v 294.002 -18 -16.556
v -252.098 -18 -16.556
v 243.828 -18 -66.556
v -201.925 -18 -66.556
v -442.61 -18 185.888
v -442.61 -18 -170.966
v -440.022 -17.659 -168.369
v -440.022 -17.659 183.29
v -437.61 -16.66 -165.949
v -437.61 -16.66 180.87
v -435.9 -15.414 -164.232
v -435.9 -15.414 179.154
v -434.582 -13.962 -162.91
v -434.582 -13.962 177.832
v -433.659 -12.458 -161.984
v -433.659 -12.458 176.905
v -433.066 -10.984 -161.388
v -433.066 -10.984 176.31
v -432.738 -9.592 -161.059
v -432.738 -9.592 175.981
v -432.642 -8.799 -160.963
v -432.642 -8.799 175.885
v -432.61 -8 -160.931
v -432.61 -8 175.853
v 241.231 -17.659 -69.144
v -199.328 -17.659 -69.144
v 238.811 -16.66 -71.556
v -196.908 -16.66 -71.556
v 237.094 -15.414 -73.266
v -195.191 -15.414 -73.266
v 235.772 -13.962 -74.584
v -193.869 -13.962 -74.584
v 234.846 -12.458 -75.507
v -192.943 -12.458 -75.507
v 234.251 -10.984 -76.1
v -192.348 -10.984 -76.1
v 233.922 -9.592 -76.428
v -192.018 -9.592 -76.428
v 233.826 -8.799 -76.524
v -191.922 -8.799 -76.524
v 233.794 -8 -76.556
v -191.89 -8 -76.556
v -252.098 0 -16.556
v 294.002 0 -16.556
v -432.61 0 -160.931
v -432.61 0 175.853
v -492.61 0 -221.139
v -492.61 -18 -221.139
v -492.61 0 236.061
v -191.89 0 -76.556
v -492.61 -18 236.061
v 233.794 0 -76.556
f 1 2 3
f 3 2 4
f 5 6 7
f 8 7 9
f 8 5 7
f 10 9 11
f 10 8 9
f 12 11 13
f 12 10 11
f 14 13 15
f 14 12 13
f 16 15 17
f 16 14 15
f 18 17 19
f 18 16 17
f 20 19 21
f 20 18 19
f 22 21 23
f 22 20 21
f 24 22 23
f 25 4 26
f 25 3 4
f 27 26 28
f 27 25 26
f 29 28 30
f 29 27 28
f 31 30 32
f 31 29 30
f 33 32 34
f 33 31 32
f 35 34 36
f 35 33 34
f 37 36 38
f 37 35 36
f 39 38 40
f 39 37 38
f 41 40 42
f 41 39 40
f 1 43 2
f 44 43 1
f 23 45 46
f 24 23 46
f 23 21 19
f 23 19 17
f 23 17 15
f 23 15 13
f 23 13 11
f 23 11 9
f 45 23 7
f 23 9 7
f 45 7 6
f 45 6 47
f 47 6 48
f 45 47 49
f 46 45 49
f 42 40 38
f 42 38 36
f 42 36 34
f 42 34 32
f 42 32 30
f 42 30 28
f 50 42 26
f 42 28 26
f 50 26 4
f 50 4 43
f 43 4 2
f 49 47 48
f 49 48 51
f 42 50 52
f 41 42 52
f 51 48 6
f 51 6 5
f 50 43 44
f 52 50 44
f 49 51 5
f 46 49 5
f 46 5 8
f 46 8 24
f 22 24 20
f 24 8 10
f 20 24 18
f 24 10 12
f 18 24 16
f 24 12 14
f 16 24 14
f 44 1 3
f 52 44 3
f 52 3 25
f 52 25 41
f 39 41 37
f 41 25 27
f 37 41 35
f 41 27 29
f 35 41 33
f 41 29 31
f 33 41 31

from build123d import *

# Parameters (mm, degrees)
F0_W      = 546.1
F0_H      = 60
F1_DEPTH  = 18
F3_DEPTH  = 18.001
F5_DEPTH  = 18.001
F6_W      = 60
F6_H      = 457.2
F7_DEPTH  = 18
F9_DEPTH  = 18.001
F11_DEPTH = 18.001
F12_R     = 10
F13_R     = 10


with BuildPart() as f1:
    # F0 (on Front) → F1 (new body)
    with BuildSketch(Plane.XZ):
        with Locations((20.951711, -46.555604)):
            Rectangle(F0_W, F0_H)
    extrude(amount=F1_DEPTH)

    # F2 (on face) → F3 (cut, through all)
    with BuildSketch(Plane.XZ.offset(18)):
        Polygon((-191.890316, -76.555604), (-252.098289, -16.555604), (-252.098289, -76.555604), align=None)
    extrude(amount=-F3_DEPTH, mode=Mode.SUBTRACT)

    # F4 (on face) → F5 (cut, through all)
    with BuildSketch(Plane.XZ.offset(18)):
        Polygon((294.001711, -76.555604), (294.001711, -16.555604), (233.793738, -76.555604), align=None)
    extrude(amount=-F5_DEPTH, mode=Mode.SUBTRACT)

    # F12
    f12_edges = [f1.edges().sort_by_distance(p)[0] for p in [
        (20.951711, -18, -76.555604),
    ]]
    fillet(f12_edges, radius=F12_R)


with BuildPart() as f7:
    # F6 (on Front) → F7 (new body)
    with BuildSketch(Plane.XZ):
        with Locations((-462.610438, 7.46084)):
            Rectangle(F6_W, F6_H)
    extrude(amount=F7_DEPTH)

    # F8 (on face) → F9 (cut, through all)
    with BuildSketch(Plane.XZ.offset(18)):
        Polygon((-432.610438, 236.06084), (-492.610438, 236.06084), (-432.610438, 175.852868), align=None)
    extrude(amount=-F9_DEPTH, mode=Mode.SUBTRACT)

    # F10 (on face) → F11 (cut, through all)
    with BuildSketch(Plane.XZ.offset(18)):
        Polygon((-432.610438, -160.931187), (-492.610438, -221.13916), (-432.610438, -221.13916), align=None)
    extrude(amount=-F11_DEPTH, mode=Mode.SUBTRACT)

    # F13
    f13_edges = [f7.edges().sort_by_distance(p)[0] for p in [
        (-432.610438, -18, 7.46084),
    ]]
    fillet(f13_edges, radius=F13_R)


solid = Compound([f1.part, f7.part])
